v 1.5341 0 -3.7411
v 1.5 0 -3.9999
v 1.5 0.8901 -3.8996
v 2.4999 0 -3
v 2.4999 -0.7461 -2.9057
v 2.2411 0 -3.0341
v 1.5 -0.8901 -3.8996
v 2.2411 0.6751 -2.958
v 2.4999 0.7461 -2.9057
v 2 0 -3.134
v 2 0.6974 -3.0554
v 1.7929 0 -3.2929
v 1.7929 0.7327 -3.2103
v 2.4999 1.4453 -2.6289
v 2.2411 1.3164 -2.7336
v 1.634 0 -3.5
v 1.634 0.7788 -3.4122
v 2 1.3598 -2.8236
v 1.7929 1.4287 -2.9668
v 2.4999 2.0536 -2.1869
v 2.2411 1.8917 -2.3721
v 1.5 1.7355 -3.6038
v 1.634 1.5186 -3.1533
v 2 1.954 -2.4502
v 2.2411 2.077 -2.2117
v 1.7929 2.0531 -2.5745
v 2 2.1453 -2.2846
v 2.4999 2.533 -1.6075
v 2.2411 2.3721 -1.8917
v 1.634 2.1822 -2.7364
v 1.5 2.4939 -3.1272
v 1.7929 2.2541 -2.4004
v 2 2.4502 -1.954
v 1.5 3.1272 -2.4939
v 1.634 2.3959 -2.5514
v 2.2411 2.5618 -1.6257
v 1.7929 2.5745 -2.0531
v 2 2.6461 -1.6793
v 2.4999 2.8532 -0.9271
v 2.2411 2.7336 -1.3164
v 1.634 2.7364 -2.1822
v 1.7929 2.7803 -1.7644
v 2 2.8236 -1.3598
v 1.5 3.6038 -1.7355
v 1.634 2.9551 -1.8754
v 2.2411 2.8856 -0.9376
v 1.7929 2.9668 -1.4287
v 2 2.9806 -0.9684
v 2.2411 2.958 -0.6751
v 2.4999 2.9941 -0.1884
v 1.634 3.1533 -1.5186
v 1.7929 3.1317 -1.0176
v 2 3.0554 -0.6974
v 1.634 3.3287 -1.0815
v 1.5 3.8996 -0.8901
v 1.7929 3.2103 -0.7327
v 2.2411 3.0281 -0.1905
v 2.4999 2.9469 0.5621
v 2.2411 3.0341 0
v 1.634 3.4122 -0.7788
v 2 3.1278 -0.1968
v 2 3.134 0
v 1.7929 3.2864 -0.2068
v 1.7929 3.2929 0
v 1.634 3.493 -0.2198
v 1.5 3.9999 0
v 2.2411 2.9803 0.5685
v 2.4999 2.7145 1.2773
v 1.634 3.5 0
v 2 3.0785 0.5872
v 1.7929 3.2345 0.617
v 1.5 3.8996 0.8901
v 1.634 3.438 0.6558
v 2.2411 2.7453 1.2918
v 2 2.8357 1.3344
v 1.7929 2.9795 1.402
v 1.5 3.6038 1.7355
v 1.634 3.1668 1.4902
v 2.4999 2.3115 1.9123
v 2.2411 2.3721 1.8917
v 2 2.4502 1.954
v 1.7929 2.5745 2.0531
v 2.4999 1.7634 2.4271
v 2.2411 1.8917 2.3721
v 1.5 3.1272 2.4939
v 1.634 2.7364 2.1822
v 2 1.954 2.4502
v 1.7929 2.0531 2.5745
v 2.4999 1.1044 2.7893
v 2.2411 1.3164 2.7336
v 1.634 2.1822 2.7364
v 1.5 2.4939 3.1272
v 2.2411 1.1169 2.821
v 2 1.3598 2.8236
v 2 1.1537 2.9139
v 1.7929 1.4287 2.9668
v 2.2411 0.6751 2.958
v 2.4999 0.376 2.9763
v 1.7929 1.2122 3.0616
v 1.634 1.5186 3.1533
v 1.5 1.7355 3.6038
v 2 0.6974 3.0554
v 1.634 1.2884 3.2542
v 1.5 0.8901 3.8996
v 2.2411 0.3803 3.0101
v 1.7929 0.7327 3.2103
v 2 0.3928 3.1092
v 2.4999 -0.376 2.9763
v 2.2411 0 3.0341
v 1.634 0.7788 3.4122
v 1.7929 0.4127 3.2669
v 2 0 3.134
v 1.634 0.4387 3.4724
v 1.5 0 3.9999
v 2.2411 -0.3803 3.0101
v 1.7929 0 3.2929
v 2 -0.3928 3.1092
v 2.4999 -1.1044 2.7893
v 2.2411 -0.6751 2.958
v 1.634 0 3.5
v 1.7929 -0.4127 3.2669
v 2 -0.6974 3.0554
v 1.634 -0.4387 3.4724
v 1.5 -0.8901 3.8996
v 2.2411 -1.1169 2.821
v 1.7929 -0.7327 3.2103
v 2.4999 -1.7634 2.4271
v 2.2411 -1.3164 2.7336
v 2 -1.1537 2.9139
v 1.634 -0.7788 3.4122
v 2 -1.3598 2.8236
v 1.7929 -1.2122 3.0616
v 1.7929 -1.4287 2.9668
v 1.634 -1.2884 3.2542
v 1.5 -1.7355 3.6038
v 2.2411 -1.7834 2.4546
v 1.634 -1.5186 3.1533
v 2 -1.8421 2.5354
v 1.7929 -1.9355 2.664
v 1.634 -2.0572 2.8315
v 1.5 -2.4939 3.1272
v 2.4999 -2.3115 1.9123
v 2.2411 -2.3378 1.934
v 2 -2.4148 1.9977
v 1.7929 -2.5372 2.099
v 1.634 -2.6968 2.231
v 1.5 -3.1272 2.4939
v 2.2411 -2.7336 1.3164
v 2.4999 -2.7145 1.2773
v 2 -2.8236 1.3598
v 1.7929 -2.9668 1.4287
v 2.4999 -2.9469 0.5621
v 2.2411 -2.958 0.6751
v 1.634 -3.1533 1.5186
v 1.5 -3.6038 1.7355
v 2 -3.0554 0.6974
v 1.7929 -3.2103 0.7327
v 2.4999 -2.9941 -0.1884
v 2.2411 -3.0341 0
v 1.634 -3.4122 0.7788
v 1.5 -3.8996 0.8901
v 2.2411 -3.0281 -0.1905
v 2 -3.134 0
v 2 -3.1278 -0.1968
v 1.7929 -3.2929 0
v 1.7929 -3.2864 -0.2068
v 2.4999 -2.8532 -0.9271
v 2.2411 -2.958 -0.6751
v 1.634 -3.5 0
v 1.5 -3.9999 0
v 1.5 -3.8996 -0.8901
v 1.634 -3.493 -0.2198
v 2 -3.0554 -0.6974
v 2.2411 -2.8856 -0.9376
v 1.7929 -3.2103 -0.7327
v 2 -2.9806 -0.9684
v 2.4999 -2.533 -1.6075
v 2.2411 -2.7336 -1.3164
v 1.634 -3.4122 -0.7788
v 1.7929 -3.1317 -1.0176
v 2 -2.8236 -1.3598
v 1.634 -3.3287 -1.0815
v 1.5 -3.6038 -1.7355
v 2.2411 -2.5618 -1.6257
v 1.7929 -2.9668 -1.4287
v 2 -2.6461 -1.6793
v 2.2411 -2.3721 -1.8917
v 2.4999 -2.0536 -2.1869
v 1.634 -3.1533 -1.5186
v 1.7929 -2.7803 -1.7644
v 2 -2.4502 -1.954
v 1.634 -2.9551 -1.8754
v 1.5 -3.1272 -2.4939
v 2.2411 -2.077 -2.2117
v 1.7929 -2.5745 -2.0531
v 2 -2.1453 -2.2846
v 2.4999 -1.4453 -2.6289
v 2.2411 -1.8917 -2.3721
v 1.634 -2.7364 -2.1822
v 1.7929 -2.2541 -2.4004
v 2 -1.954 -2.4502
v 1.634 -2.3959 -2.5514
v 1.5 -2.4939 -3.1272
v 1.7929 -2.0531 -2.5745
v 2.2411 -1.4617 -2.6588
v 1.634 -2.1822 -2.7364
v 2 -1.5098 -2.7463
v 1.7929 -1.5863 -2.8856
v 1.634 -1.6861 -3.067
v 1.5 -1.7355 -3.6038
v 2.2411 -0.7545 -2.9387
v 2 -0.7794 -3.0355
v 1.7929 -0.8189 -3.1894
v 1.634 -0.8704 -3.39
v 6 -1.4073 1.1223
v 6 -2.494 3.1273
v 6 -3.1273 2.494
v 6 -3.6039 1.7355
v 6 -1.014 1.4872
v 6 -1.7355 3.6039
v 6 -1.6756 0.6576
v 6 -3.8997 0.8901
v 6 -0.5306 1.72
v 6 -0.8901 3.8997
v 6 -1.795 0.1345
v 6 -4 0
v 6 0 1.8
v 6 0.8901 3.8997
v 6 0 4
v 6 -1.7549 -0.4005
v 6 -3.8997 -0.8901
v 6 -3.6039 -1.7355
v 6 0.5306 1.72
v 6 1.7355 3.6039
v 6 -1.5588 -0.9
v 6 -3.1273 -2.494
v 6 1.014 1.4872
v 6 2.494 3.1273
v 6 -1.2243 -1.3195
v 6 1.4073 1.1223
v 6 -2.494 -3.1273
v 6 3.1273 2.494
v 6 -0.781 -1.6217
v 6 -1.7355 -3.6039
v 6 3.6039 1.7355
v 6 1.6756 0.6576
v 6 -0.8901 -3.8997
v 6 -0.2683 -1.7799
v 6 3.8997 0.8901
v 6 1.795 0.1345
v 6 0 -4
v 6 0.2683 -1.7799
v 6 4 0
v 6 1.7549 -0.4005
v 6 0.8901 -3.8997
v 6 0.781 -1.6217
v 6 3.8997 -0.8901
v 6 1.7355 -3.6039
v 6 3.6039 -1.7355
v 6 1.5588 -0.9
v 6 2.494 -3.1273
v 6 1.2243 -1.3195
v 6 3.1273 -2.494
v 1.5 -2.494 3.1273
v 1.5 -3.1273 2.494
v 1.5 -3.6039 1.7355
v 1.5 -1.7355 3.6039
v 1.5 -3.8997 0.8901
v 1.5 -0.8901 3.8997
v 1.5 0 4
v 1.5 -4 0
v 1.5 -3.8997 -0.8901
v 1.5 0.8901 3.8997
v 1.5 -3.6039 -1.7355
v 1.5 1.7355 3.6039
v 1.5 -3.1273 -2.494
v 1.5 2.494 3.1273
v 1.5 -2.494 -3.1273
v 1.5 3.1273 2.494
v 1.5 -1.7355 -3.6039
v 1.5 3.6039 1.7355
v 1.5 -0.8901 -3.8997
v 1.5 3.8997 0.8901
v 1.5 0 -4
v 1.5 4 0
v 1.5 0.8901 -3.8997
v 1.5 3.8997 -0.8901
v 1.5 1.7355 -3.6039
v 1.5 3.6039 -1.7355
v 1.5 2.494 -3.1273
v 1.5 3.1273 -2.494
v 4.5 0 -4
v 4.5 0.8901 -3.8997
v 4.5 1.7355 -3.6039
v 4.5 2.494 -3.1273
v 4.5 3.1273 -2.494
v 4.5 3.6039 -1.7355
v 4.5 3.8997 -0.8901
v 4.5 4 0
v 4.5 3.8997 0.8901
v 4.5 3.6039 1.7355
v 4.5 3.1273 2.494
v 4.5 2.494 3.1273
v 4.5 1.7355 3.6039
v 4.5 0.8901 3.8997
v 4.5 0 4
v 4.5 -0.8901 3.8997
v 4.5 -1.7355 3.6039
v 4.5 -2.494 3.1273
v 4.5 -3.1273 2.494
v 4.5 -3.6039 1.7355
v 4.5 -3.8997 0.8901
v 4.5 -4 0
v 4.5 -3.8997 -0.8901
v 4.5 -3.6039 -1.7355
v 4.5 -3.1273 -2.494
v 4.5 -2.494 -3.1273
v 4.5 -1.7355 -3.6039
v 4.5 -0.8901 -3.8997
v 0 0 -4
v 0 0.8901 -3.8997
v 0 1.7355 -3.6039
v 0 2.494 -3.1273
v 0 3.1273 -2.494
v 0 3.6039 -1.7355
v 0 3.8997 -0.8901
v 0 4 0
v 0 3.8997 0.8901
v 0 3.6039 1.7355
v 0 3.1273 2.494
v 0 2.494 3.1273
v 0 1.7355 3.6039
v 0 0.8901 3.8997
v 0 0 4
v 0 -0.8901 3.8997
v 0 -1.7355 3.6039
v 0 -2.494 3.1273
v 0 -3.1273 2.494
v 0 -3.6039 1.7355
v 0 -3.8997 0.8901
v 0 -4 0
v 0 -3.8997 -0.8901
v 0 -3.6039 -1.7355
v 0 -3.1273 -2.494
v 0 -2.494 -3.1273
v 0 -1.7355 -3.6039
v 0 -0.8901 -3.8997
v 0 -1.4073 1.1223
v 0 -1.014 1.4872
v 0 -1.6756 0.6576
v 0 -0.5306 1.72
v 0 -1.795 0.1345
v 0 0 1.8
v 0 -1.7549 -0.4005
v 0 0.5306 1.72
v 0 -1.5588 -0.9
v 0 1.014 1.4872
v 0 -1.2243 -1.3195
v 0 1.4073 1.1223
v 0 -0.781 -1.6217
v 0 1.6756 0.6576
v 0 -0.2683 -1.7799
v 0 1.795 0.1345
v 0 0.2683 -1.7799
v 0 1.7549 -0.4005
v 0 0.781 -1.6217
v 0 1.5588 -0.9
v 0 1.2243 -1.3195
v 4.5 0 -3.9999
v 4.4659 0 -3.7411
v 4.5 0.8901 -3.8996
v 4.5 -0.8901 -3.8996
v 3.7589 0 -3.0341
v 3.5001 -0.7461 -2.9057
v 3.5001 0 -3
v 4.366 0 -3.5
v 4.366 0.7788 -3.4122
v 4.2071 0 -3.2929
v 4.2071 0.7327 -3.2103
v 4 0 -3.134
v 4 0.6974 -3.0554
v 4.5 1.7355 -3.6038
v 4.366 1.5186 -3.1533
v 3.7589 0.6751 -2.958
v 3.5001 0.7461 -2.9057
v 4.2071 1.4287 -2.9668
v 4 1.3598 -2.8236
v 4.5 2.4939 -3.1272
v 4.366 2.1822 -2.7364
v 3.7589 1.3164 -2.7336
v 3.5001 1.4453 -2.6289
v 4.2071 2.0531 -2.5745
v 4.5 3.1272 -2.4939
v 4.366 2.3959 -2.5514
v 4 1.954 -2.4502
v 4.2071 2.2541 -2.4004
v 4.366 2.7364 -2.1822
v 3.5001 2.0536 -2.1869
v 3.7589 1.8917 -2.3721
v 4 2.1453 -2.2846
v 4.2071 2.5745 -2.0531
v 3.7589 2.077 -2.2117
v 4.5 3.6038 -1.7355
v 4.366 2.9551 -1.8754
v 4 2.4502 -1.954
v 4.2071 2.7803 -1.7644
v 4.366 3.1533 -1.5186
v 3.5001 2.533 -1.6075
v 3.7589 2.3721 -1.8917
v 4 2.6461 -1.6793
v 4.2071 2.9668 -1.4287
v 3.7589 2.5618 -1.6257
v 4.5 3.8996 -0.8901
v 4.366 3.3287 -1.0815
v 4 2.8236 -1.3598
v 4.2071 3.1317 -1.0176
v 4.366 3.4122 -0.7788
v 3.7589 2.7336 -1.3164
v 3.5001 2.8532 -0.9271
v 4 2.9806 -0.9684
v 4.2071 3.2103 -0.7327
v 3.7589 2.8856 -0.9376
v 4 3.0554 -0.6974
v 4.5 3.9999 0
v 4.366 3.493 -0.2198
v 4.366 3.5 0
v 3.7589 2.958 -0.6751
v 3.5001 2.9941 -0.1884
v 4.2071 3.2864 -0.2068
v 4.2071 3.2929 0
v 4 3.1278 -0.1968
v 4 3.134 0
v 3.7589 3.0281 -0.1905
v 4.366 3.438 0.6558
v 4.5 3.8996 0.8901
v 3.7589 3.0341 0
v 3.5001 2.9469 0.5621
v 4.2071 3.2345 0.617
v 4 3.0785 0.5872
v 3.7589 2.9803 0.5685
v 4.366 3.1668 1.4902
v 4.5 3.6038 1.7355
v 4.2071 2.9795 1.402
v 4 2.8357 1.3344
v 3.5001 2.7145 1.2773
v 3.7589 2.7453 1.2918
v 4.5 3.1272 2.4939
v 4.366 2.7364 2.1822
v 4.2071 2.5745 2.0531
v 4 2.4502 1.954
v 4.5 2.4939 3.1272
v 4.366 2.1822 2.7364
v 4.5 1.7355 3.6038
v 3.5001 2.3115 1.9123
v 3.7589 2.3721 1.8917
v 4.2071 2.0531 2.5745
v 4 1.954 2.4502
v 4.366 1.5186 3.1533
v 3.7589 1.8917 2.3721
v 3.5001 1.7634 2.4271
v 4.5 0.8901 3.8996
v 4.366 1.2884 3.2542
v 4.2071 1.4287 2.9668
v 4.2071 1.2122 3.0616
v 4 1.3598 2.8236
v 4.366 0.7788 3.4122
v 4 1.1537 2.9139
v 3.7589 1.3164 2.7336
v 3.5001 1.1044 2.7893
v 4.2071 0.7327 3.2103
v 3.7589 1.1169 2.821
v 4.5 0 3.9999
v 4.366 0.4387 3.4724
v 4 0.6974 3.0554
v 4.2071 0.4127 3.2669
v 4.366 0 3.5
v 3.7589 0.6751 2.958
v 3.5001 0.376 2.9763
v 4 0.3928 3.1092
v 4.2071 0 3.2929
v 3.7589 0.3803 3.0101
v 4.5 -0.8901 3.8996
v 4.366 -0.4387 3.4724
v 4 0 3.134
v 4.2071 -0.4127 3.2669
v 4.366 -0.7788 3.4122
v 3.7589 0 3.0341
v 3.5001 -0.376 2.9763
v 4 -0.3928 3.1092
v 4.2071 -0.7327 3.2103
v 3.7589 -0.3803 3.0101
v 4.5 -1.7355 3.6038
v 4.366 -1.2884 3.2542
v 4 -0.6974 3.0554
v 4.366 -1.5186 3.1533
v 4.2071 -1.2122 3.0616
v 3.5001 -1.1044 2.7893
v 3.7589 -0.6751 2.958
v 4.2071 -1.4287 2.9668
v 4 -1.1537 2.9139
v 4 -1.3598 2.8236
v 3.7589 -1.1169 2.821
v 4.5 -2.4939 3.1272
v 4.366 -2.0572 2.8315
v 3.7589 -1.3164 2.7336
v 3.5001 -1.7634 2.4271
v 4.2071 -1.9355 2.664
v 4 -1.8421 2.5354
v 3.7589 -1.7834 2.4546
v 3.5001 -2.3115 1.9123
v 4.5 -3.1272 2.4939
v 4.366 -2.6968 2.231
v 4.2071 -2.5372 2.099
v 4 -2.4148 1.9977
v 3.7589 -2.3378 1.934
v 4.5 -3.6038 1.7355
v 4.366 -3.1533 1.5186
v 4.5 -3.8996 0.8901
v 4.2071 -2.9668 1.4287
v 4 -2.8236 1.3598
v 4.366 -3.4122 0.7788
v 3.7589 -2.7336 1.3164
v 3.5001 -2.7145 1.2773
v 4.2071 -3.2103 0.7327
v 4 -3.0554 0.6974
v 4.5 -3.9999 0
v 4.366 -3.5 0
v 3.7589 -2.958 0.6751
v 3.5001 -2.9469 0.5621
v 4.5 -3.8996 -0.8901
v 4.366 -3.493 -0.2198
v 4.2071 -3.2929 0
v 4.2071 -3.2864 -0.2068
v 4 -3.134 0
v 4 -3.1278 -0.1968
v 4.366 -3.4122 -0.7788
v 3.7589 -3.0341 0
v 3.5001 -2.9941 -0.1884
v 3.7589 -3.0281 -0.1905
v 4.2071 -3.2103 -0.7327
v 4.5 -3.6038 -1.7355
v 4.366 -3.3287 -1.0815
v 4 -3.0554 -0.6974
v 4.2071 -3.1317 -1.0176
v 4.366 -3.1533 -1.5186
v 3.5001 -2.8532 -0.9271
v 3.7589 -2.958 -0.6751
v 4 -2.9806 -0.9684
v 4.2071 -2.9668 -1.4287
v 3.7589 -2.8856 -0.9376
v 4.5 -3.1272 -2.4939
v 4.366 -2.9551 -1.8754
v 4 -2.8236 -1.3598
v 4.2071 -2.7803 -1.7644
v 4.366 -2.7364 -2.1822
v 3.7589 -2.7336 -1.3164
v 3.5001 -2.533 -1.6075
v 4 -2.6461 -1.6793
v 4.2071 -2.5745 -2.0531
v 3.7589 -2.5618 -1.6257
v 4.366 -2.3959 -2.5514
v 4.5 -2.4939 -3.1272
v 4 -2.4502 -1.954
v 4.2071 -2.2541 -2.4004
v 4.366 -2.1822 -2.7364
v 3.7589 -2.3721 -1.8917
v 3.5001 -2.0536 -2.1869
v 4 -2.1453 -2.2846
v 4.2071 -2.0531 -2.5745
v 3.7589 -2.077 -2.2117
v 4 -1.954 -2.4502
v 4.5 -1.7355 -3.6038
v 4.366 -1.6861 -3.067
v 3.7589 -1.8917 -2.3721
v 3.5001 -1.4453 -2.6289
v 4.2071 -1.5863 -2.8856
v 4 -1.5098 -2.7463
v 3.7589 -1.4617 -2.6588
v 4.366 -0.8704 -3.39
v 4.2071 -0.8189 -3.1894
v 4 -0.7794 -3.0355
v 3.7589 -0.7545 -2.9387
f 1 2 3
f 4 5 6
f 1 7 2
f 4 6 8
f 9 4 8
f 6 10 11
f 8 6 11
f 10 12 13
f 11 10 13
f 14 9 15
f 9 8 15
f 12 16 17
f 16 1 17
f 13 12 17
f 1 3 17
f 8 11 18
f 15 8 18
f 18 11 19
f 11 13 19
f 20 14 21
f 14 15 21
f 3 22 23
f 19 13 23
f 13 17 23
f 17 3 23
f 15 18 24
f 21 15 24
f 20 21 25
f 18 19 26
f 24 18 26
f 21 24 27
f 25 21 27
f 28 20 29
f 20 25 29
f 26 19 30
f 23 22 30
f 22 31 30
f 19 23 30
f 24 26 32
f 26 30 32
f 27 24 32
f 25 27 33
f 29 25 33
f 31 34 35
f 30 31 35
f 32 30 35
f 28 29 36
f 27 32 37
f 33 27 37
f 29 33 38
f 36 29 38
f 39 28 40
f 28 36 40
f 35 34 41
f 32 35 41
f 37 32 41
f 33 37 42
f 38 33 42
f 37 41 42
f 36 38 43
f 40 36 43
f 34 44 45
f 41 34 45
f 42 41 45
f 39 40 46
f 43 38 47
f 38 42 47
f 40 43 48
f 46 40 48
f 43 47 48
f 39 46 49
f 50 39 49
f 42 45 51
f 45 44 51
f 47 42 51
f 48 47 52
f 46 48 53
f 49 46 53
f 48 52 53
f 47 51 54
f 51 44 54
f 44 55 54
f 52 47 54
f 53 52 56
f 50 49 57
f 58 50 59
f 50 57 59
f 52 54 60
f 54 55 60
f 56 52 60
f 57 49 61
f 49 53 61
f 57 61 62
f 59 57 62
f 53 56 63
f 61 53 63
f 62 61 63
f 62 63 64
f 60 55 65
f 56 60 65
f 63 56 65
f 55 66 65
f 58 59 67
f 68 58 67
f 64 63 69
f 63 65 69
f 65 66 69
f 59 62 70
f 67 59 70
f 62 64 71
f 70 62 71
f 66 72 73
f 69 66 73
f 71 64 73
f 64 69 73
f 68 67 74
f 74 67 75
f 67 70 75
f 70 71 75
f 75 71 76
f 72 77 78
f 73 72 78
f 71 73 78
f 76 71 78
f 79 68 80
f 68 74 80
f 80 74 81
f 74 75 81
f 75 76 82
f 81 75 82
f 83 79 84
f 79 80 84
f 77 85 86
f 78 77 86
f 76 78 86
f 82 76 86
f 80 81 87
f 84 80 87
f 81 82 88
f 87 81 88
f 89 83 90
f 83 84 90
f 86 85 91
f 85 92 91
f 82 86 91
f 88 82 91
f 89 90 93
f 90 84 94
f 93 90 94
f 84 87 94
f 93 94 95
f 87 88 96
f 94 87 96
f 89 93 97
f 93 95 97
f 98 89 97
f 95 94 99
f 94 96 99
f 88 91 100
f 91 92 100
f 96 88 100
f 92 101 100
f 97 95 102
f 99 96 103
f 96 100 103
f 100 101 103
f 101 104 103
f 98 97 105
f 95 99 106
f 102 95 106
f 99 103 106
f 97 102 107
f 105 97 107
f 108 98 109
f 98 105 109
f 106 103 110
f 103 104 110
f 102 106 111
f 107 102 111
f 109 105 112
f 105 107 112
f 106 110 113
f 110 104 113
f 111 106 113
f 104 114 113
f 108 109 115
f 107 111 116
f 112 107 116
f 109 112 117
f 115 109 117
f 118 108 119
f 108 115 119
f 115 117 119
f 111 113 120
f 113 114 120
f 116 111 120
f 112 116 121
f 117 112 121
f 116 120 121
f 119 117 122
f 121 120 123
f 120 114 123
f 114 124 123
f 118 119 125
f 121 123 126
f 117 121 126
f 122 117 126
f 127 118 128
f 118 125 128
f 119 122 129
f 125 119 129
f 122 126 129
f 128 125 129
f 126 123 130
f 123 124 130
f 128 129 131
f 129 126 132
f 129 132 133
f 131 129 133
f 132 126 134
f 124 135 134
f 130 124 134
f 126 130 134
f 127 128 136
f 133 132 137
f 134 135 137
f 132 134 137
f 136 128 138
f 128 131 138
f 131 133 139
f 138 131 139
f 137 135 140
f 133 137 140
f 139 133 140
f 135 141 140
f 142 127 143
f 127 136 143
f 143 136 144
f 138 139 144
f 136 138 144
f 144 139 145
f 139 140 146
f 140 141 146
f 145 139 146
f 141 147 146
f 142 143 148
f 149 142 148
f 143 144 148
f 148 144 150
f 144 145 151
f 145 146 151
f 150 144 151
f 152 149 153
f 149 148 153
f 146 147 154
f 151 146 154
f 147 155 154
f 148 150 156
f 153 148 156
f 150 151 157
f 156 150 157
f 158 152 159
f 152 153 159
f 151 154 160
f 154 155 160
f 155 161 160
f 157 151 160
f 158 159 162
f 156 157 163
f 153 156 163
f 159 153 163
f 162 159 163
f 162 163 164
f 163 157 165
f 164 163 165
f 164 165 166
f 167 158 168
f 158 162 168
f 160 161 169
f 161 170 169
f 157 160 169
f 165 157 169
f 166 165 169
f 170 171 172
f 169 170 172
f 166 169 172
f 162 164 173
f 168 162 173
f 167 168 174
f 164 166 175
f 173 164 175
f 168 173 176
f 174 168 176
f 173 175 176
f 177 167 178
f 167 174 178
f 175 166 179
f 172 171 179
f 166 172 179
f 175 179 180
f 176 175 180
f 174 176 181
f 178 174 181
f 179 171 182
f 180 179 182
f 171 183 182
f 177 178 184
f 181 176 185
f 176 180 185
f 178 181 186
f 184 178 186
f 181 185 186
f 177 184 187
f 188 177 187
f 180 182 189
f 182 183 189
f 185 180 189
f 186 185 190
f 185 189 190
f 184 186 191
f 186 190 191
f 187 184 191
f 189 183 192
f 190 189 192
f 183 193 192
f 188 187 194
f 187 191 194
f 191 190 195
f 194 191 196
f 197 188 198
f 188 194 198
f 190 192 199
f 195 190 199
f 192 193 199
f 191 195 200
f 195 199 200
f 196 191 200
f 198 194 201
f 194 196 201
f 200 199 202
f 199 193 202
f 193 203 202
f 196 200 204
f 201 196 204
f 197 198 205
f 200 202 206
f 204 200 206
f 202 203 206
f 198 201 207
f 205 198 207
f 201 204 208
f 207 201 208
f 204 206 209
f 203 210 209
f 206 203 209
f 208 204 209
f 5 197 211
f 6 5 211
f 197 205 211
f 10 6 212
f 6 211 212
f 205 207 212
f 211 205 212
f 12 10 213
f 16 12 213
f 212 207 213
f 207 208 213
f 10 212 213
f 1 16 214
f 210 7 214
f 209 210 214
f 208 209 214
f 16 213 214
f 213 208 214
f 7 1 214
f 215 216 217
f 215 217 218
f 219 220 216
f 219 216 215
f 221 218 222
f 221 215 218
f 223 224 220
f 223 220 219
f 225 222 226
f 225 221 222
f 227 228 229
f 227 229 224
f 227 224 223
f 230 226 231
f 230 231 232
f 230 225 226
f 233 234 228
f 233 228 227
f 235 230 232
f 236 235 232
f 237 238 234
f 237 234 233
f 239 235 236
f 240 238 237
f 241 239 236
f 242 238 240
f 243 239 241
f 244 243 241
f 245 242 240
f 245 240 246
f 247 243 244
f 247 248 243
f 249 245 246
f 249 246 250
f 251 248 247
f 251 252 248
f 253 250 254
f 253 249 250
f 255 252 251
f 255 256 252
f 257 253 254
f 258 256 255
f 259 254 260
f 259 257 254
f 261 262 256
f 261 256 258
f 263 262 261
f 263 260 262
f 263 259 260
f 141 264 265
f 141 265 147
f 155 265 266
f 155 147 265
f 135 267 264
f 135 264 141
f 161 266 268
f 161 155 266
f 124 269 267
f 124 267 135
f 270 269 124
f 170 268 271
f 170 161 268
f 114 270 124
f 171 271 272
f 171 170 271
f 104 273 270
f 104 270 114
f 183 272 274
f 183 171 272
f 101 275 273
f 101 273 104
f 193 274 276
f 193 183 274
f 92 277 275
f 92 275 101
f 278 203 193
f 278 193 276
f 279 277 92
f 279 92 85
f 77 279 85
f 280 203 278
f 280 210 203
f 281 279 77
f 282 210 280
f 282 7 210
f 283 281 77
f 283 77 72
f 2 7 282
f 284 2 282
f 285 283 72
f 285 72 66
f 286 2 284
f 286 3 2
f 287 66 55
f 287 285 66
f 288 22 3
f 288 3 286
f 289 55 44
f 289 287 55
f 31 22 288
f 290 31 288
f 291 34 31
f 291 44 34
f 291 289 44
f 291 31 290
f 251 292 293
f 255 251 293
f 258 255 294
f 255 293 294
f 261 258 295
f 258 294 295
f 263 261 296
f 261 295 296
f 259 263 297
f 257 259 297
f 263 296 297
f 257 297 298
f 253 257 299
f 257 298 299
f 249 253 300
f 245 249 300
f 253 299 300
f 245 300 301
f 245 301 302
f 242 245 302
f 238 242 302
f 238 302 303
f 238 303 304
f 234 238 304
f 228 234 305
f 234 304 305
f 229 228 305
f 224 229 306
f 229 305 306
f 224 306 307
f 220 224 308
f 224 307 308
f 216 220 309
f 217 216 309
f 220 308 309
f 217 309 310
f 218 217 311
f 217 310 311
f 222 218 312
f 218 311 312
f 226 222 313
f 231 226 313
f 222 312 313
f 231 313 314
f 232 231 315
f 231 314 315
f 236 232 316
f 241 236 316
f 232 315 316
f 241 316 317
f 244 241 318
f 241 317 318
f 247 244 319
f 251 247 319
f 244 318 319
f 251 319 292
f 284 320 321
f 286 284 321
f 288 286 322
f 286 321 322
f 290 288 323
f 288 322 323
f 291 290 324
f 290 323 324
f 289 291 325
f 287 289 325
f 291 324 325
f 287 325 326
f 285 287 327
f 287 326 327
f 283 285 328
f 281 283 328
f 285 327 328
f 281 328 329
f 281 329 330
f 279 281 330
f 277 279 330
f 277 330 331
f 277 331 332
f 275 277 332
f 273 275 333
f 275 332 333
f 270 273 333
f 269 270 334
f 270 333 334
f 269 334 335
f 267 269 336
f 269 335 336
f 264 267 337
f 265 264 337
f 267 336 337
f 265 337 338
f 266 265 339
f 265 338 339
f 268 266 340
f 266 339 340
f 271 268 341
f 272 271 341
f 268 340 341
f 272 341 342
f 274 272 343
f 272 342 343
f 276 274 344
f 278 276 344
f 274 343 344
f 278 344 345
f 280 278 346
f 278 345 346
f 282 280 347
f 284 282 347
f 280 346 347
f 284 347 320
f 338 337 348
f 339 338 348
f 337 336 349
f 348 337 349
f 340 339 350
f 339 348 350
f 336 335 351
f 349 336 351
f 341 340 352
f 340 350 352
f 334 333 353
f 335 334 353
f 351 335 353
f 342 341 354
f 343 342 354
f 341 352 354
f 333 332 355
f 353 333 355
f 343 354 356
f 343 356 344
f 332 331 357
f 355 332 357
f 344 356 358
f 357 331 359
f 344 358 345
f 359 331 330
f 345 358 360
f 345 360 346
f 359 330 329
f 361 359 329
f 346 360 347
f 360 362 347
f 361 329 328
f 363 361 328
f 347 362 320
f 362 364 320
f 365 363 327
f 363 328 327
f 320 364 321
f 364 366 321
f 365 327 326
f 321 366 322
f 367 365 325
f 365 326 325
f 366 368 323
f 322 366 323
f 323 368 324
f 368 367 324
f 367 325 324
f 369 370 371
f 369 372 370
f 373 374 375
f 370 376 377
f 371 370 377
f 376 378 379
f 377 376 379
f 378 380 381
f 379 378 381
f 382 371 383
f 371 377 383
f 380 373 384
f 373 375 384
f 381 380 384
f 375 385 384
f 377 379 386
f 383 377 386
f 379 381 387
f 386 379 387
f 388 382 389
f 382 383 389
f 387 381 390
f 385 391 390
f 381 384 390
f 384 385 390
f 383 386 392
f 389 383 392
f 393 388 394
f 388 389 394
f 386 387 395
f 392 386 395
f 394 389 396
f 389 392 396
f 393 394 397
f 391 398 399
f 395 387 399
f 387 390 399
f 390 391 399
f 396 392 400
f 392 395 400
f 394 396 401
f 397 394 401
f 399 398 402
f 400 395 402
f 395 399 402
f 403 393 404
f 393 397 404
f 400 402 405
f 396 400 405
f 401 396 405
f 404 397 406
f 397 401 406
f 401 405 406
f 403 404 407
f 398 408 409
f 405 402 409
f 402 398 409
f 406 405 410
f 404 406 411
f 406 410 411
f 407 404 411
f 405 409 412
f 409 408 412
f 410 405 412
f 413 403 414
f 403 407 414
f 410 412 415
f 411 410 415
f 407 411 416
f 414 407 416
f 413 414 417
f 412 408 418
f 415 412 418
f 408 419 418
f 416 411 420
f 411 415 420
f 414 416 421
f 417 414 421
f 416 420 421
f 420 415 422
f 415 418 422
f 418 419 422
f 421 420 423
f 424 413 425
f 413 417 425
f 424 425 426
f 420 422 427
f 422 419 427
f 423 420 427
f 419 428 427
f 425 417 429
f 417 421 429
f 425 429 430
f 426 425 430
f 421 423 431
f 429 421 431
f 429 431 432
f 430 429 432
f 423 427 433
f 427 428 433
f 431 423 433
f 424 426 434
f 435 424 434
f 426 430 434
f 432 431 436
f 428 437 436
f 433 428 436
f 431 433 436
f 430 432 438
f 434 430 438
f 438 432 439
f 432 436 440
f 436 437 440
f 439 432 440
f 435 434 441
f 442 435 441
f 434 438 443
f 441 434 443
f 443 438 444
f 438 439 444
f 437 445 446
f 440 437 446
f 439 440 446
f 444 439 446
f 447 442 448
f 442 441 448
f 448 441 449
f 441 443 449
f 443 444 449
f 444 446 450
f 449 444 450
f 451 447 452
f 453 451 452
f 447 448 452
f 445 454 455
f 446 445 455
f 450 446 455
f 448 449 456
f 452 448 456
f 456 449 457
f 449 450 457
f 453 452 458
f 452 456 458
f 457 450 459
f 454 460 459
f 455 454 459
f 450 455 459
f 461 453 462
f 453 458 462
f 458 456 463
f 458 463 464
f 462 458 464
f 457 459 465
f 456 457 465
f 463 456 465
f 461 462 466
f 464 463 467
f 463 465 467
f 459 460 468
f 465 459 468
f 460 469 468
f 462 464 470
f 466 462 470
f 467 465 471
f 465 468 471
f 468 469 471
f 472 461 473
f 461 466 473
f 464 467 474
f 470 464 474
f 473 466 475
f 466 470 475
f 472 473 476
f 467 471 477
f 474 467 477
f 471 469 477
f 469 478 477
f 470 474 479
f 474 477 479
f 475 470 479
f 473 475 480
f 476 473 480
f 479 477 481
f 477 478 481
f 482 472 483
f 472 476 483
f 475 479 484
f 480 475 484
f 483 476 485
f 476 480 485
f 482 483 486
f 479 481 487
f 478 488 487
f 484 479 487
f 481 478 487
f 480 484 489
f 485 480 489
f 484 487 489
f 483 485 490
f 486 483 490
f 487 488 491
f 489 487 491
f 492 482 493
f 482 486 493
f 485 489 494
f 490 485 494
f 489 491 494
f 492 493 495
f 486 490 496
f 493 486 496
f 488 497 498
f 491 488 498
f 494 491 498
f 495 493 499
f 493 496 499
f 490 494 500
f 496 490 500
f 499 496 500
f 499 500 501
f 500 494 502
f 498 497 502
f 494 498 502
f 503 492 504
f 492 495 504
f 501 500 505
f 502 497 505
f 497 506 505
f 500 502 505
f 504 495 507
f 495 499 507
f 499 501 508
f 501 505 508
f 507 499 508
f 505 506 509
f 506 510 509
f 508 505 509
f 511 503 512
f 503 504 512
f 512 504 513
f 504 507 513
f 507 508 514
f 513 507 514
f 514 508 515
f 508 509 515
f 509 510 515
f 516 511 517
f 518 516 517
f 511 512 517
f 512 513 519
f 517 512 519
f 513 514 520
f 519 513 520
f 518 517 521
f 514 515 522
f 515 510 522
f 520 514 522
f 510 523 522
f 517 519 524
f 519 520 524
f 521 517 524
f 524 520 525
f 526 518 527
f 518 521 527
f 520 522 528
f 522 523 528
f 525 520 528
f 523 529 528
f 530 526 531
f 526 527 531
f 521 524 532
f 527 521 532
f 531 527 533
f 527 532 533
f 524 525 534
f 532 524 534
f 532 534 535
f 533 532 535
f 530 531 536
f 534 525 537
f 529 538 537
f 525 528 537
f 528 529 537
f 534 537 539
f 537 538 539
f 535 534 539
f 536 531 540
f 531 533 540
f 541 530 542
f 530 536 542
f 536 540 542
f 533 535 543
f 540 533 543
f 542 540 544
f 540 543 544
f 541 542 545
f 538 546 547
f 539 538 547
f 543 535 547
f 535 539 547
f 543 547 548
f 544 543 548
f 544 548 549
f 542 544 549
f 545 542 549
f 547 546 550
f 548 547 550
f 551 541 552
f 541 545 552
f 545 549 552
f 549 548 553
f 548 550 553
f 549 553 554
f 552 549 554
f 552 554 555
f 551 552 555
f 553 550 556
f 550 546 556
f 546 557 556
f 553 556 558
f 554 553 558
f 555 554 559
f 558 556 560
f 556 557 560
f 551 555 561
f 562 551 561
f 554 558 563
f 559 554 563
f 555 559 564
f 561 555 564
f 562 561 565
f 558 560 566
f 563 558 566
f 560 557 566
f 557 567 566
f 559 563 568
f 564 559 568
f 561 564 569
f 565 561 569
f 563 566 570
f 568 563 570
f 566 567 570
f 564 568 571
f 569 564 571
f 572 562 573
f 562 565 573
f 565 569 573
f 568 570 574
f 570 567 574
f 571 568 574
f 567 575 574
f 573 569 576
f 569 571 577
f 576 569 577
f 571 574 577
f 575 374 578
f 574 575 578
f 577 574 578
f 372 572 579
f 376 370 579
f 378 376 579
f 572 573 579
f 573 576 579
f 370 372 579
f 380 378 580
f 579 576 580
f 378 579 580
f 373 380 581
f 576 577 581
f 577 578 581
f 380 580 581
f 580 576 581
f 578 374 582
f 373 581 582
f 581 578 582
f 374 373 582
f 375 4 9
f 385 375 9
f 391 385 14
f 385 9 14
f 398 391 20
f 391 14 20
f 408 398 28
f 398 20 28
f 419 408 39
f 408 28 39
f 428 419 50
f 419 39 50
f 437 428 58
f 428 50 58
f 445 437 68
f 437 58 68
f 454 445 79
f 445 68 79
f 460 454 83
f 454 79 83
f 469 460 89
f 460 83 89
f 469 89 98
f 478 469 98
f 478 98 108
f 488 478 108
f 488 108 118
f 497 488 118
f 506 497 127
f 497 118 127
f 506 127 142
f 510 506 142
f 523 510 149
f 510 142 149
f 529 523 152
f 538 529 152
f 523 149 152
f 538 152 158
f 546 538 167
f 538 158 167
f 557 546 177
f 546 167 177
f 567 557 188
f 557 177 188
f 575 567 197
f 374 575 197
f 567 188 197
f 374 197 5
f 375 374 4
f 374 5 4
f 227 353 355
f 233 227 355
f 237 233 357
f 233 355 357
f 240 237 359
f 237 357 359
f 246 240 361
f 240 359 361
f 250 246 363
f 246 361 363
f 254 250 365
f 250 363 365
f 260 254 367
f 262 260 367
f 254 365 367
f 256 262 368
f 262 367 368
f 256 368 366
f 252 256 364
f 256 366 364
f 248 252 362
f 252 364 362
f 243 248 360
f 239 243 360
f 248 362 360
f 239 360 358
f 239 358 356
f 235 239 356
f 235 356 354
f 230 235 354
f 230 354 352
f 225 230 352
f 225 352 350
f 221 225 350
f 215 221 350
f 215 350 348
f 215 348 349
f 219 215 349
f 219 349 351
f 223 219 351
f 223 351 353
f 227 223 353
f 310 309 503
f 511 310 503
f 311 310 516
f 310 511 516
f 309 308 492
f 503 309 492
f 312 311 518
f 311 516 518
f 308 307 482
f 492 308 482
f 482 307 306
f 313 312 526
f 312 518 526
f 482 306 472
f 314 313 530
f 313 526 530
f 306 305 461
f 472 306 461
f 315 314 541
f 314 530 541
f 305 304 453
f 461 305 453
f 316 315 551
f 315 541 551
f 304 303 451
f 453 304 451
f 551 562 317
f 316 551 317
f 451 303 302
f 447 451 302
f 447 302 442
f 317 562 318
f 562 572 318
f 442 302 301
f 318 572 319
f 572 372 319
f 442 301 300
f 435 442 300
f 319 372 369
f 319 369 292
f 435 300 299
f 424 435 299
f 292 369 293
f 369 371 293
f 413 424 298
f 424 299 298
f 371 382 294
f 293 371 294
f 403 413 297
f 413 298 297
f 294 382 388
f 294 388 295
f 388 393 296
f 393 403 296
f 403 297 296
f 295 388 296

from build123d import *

# Parameters (mm, degrees)
SKETCH1_R           = 4
BOSS_EXTRUDE1_DEPTH = 1.5
SKETCH2_R           = 3
BOSS_EXTRUDE2_DEPTH = 3
SKETCH3_R           = 4
BOSS_EXTRUDE3_DEPTH = 1.5
FILLET1_R           = 1
SKETCH4_R           = 1.8
CUT_EXTRUDE1_DEPTH  = 9.246211251


with BuildPart() as part:
    # Sketch1 → Boss-Extrude1 (new body)
    with BuildSketch(Plane(origin=(0, 0, 0), x_dir=(0, 0, -1), z_dir=(1, 0, 0))):
        Circle(SKETCH1_R)
    extrude(amount=BOSS_EXTRUDE1_DEPTH)

    # Sketch2 → Boss-Extrude2 (add)
    with BuildSketch(Plane(origin=(1.5, 0, 0), x_dir=(0, 0, -1), z_dir=(1, 0, 0))):
        Circle(SKETCH2_R)
    extrude(amount=BOSS_EXTRUDE2_DEPTH)

    # Sketch3 → Boss-Extrude3 (add)
    with BuildSketch(Plane(origin=(4.5, 0, 0), x_dir=(0, 0, -1), z_dir=(1, 0, 0))):
        Circle(SKETCH3_R)
    extrude(amount=BOSS_EXTRUDE3_DEPTH)

    # Fillet1
    fillet1_edges = [part.edges().sort_by_distance(p)[0] for p in [
        (1.5, 0, 3),
        (4.5, 0, 3),
    ]]
    fillet(fillet1_edges, radius=FILLET1_R - 0.0001)  # a hair under: the kernel refuses the full size

    # Sketch4 → Cut-Extrude1 (cut, through all)
    with BuildSketch(Plane.ZY):
        Circle(SKETCH4_R)
    extrude(amount=-CUT_EXTRUDE1_DEPTH, mode=Mode.SUBTRACT)


solid = part.part
